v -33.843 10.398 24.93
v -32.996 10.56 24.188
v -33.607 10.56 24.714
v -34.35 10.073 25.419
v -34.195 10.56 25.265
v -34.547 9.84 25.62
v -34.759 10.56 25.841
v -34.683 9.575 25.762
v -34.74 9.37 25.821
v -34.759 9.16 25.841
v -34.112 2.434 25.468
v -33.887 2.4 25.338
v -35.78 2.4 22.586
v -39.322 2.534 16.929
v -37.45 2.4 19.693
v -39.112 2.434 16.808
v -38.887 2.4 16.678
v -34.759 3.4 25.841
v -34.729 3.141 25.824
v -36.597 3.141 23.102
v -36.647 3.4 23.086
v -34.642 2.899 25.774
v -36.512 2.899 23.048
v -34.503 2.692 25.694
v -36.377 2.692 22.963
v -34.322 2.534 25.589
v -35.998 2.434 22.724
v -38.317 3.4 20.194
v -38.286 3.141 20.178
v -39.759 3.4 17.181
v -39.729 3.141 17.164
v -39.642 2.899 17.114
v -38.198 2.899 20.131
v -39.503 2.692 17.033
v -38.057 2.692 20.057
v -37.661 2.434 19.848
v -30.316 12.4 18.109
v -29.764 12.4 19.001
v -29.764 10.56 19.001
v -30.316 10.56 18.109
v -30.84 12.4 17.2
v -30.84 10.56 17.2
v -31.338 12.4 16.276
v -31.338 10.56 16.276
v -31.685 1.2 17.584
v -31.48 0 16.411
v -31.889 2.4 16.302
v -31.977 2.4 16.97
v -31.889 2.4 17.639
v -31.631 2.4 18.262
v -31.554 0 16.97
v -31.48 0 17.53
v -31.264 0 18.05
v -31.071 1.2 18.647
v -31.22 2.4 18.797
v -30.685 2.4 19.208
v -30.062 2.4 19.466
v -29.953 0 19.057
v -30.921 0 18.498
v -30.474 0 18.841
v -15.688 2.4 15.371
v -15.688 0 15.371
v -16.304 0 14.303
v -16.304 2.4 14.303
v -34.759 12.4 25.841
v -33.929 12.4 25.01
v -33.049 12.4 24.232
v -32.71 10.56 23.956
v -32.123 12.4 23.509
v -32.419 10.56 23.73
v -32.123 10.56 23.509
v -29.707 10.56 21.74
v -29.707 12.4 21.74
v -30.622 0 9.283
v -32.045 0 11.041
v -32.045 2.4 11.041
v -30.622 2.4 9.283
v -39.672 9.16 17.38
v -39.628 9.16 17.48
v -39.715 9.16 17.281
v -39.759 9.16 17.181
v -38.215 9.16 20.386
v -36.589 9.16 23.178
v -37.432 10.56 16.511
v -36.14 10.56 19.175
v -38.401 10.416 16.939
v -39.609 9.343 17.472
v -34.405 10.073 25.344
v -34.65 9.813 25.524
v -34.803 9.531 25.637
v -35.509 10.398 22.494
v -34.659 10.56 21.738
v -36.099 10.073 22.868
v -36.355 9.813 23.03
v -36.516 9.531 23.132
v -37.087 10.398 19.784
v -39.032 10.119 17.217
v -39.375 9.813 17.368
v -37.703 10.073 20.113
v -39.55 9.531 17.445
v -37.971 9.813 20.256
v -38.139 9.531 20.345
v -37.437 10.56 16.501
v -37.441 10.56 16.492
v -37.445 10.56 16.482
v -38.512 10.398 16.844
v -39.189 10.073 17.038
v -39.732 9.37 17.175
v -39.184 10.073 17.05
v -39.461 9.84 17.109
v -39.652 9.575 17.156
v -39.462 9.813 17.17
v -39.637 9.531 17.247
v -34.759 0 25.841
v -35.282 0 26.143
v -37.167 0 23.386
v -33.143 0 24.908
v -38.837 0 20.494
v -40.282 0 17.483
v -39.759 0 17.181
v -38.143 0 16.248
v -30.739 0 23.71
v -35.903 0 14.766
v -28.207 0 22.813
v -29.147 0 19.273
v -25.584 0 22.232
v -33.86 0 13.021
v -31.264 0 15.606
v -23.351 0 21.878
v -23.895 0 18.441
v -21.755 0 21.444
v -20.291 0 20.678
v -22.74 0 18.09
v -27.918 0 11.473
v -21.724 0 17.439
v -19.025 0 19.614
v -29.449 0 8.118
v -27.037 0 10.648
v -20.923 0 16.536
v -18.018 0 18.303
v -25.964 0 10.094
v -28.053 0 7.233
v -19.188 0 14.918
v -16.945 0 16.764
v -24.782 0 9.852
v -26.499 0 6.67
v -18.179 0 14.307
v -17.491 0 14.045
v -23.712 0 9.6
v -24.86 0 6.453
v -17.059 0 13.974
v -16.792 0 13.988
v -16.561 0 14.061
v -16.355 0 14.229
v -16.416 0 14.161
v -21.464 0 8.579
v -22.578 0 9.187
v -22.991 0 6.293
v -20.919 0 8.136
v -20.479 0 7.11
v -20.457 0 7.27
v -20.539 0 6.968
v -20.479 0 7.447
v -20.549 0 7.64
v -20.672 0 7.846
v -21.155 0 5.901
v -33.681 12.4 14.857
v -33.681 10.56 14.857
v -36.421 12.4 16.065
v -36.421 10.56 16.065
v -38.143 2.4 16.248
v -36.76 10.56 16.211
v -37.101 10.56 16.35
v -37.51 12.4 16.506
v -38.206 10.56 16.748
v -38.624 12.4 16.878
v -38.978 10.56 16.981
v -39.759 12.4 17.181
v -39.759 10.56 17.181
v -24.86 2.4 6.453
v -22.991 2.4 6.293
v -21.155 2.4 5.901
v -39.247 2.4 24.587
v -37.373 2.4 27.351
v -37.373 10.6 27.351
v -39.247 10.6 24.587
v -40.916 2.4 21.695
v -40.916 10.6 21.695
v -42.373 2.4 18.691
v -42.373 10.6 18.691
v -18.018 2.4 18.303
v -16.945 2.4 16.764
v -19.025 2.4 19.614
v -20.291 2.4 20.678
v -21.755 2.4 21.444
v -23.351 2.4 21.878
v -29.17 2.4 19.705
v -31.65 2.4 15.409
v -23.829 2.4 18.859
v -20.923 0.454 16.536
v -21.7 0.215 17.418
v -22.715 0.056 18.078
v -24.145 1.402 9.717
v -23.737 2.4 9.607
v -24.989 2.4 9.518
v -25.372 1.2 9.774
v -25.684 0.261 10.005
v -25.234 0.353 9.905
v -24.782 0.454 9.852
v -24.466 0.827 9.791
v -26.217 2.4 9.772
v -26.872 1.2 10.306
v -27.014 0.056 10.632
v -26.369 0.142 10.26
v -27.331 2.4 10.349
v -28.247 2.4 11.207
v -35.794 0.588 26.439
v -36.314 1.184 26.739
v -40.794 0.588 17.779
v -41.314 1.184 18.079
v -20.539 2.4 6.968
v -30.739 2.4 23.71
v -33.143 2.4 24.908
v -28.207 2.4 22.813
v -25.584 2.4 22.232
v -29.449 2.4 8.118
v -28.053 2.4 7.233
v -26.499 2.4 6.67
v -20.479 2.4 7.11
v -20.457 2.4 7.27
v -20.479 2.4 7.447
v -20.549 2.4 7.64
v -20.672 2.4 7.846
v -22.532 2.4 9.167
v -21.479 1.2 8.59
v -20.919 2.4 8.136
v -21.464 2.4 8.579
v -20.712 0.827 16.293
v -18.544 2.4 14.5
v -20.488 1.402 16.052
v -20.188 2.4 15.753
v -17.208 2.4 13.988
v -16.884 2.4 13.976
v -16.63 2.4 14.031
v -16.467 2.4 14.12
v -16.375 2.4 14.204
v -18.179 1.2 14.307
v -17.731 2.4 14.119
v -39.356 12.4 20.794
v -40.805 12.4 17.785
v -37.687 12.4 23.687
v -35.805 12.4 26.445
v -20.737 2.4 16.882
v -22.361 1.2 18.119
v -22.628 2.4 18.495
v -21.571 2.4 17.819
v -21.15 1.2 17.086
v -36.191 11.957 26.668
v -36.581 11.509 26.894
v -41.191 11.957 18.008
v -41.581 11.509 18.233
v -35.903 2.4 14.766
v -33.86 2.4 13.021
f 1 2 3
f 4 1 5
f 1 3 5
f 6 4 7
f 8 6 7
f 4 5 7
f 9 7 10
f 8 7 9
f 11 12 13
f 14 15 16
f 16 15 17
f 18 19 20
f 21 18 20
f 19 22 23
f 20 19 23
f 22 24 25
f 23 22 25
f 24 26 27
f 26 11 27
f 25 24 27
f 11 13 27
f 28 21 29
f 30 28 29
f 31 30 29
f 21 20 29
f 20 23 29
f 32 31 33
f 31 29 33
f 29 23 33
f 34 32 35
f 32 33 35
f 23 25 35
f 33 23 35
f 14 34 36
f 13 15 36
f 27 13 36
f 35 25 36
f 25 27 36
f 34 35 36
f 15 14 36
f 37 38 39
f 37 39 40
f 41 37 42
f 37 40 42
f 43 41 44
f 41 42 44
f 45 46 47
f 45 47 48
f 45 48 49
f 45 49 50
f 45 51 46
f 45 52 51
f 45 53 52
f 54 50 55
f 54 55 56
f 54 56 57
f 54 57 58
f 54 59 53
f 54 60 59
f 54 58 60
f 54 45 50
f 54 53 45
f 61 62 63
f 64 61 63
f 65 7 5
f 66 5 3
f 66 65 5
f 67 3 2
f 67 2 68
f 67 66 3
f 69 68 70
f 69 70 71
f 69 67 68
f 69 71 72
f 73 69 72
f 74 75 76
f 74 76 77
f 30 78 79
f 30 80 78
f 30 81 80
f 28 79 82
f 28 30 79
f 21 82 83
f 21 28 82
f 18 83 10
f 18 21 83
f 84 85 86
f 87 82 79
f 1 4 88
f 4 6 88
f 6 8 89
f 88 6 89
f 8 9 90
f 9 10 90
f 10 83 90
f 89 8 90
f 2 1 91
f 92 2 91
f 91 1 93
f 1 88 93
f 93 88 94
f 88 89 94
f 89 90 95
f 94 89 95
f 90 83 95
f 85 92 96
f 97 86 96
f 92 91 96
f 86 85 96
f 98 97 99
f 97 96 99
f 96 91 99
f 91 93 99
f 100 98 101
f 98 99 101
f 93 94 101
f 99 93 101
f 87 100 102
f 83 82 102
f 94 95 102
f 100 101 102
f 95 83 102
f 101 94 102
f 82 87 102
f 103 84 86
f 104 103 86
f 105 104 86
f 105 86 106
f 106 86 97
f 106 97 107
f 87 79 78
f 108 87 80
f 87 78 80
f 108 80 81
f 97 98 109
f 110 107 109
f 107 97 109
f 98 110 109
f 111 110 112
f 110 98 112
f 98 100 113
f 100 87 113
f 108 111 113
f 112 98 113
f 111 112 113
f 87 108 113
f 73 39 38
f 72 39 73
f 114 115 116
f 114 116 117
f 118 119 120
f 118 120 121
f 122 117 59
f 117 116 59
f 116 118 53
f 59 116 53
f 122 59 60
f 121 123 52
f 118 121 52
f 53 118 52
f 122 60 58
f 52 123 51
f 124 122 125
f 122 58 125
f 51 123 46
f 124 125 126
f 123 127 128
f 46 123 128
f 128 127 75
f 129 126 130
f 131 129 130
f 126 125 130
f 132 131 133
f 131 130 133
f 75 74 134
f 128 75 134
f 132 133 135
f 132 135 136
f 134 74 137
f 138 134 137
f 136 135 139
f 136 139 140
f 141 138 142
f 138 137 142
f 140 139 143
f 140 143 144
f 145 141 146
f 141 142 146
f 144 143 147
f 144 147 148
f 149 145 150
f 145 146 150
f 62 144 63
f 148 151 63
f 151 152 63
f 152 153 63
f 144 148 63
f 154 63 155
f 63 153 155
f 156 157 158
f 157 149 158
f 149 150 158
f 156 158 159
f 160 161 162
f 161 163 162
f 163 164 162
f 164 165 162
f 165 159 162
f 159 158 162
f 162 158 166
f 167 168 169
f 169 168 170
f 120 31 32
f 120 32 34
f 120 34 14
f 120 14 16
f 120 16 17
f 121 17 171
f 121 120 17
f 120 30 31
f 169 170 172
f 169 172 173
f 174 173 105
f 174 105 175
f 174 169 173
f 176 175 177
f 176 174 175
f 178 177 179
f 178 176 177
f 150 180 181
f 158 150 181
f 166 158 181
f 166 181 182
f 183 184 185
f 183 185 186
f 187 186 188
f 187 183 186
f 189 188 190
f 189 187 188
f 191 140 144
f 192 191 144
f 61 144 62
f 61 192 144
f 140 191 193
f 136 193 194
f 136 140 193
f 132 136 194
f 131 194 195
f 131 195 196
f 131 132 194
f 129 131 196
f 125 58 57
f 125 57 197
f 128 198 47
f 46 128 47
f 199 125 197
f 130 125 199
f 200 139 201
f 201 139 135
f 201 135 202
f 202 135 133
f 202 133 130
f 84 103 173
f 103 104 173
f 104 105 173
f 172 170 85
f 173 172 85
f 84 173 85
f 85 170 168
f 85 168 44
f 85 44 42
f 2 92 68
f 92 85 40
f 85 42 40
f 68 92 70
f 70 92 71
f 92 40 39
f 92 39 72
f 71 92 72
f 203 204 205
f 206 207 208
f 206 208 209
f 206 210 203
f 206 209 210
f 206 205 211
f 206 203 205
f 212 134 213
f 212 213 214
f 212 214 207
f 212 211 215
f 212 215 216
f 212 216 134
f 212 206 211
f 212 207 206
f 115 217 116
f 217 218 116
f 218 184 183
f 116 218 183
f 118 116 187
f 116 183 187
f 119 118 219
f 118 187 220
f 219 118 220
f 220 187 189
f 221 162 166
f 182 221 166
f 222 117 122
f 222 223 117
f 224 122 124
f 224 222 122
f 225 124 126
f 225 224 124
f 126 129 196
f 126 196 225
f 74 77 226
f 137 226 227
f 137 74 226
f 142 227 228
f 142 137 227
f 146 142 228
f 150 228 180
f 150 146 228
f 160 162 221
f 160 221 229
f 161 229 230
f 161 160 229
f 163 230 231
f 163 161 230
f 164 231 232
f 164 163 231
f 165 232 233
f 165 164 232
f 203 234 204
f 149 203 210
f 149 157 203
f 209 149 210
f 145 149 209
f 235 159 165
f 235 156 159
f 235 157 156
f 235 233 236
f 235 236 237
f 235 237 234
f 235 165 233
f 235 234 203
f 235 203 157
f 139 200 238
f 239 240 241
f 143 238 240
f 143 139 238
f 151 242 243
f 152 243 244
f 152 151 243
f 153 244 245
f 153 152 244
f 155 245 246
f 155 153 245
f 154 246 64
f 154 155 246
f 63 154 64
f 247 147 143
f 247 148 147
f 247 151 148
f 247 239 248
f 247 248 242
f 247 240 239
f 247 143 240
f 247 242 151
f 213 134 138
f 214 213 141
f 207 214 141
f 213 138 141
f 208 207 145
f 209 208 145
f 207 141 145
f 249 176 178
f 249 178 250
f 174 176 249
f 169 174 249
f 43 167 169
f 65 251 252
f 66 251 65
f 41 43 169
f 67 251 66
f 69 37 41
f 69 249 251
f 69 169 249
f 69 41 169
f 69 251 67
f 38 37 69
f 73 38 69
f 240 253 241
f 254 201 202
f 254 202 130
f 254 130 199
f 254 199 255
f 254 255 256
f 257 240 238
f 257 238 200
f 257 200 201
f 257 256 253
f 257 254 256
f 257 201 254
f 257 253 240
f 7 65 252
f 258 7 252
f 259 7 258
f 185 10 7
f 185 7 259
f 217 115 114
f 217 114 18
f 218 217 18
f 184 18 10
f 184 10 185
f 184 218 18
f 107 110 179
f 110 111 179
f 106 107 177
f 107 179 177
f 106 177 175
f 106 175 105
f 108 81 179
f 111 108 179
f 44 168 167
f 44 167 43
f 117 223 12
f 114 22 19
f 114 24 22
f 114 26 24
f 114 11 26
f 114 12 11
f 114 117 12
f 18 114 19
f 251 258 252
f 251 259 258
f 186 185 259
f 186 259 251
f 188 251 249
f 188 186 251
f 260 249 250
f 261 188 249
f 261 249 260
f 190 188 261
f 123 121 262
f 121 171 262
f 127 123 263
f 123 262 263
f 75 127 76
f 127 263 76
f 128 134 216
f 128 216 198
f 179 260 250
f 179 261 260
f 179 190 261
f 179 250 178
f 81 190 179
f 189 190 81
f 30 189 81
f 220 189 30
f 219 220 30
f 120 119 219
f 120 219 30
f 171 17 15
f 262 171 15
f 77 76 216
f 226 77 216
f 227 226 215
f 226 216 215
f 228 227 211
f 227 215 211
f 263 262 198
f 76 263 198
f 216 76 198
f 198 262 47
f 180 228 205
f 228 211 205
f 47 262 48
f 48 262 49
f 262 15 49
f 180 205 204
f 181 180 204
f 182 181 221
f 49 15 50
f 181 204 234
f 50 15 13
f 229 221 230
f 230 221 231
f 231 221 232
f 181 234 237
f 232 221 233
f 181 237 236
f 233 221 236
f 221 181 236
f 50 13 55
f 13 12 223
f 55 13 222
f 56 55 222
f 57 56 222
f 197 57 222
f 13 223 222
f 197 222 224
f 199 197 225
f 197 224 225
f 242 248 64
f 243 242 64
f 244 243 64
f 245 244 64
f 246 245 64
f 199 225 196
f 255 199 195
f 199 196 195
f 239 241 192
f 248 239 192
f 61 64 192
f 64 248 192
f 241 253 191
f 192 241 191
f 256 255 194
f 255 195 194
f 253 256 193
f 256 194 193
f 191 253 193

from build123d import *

# Parameters (mm, degrees)
EXTRUDE_1_DEPTH     = 2.4
EXTRUDE_1_DRAFT     = 10
EXTRUDE_2_DEPTH     = 12.4
EXTRUDE_4_DEPTH     = 2.4
EXTRUDE_START       = -1.84
EXTRUDE_3_DEPTH     = 1.84
CHAMFER_1_SIZE      = 2.4
FILLET_3_R          = 1
FILLET_4_R          = 19
CHAMFER_2_SIZE      = 1.5
CHAMFER_3_SIZE      = 1.5
FILLET_5_SIZE       = 2.4
FILLET_5_SIZE_2     = 1.4
FILLET_8_R          = 15
CUT_EXTRUDE_2_DEPTH = 5
FILLET_6_DEPTH      = 2.4
FILLET_7_DEPTH      = 2.4
CHAMFER_4_SIZE      = 1.8
FILLET_9_R          = 22


with BuildPart() as part:
    # 草图1 → 凸台-拉伸1 (with draft: the straight prism first)
    with BuildSketch(Plane(origin=(0, 0, 0), x_dir=(1, 0, 0), z_dir=(0, 1, 0))):
        with BuildLine():
            Line((-8, -10.392304845), (-13, -1.732050808))
            Line((-13, -1.732050808), (-21.967816979, -6.909622355))
            Line((-21.967816979, -6.909622355), (-22.707395472, -6.711455524))
            ThreePointArc((-22.707395472, -6.711455524), (-27.045667208, -6.825066474), (-30.622176838, -9.283132374))
            Line((-30.622176838, -9.283132374), (-34.43427487, -13.990668154))
            Line((-34.43427487, -13.990668154), (-34.611399325, -14.209398026))
            Line((-34.611399325, -14.209398026), (-39.758714523, -17.181201841))
            ThreePointArc((-39.758714523, -17.181201841), (-37.509489571, -21.656113901), (-34.758714523, -25.841455878))
            Line((-34.758714523, -25.841455878), (-29.611399325, -22.869652063))
            Line((-29.611399325, -22.869652063), (-29.333411472, -22.825622721))
            Line((-29.333411472, -22.825622721), (-23.350516885, -21.878016874))
            ThreePointArc((-23.350516885, -21.878016874), (-19.433514554, -20.009701627), (-17.165988715, -16.309453567))
            Line((-17.165988715, -16.309453567), (-16.967816979, -15.569876393))
            Line((-16.967816979, -15.569876393), (-8, -10.392304845))
        make_face()
        with BuildLine():
            Line((-27.917710858, -11.473169763), (-31.264303283, -15.605855609))
            Line((-31.264303283, -15.605855609), (-31.480162481, -16.411447438))
            ThreePointArc((-31.480162481, -16.411447438), (-31.264379417, -18.05049777), (-29.952811807, -19.056896659))
            Line((-29.952811807, -19.056896659), (-29.147219046, -19.27275307))
            Line((-29.147219046, -19.27275307), (-23.894912088, -18.440861966))
            ThreePointArc((-23.894912088, -18.440861966), (-21.762087, -17.423555776), (-20.527408298, -15.408754734))
            Line((-20.527408298, -15.408754734), (-19.958845574, -13.286877913))
            ThreePointArc((-19.958845574, -13.286877913), (-20.174626779, -11.647826039), (-21.486196869, -10.641428268))
            Line((-21.486196869, -10.641428268), (-23.608077089, -10.07287972))
            ThreePointArc((-23.608077089, -10.07287972), (-25.97028529, -10.134742248), (-27.917710858, -11.473169763))
        make_face(mode=Mode.SUBTRACT)
    extrude(amount=EXTRUDE_1_DEPTH)
    # 凸台-拉伸1: the draft: its side faces are tilted about the plane it starts from
    extrude_1_sides = [part.faces().sort_by_distance(p)[0] for p in [
        (-26.480958105, 1.2, 22.373834469),
        (-29.59100707, 1.2, 13.539512686),
        (-31.372232882, 1.2, 16.008651523),
        (-31.264379417, 1.2, 18.05049777),
        (-29.550015427, 1.2, 19.164824864),
        (-26.521065567, 1.2, 18.856807518),
        (-21.762087, 1.2, 17.423555776),
        (-20.243126936, 1.2, 14.347816323),
        (-20.174626779, 1.2, 11.647826039),
        (-22.547136979, 1.2, 10.357153994),
        (-25.97028529, 1.2, 10.134742248),
        (-37.509489571, 1.2, 21.656113901),
        (-37.185056924, 1.2, 15.695299933),
        (-32.616788082, 1.2, 11.7462652),
        (-27.045667208, 1.2, 6.825066474),
        (-22.337606226, 1.2, 6.810538939),
        (-17.48390849, 1.2, 4.320836581),
        (-10.5, 1.2, 6.062177826),
        (-12.48390849, 1.2, 12.981090619),
        (-17.066902847, 1.2, 15.93966498),
        (-32.185056924, 1.2, 24.355553971),
        (-19.433514554, 1.2, 20.009701627),
    ]]
    draft(extrude_1_sides, Plane(origin=(0, 0, 0), x_dir=(1, 0, 0), z_dir=(0, 1, 0)), EXTRUDE_1_DRAFT)



with BuildPart() as body_2:
    # 草图3 → 凸台-拉伸2 (new body)
    with BuildSketch(Plane.XZ):
        with BuildLine():
            Line((-34.758714523, 25.841455878), (-37.373134226, 27.350891798))
            ThreePointArc((-37.373134226, 27.350891798), (-40.107565783, 23.156113901), (-42.373134226, 18.69063776))
            Line((-42.373134226, 18.69063776), (-39.758714523, 17.181201841))
            ThreePointArc((-39.758714523, 17.181201841), (-37.509489571, 21.656113901), (-34.758714523, 25.841455878))
        make_face()
    extrude(amount=-EXTRUDE_2_DEPTH)


with BuildPart() as part_1:
    add(part.part)

    add(body_2.part)  # 凸台-拉伸4 merges body 2
    # 草图2 → 凸台-拉伸4 (add)
    with BuildSketch(Plane.XZ):
        with BuildLine():
            Line((-13, 1.732050808), (-8, 10.392304845))
            Line((-8, 10.392304845), (-16.967816979, 15.569876393))
            Line((-16.967816979, 15.569876393), (-17.165988715, 16.309453567))
            ThreePointArc((-17.165988715, 16.309453567), (-19.433514554, 20.009701627), (-23.350516885, 21.878016874))
            Line((-23.350516885, 21.878016874), (-29.611399325, 22.869652063))
            Line((-29.611399325, 22.869652063), (-34.758714523, 25.841455878))
            ThreePointArc((-34.758714523, 25.841455878), (-37.509489571, 21.656113901), (-39.758714523, 17.181201841))
            Line((-39.758714523, 17.181201841), (-34.611399325, 14.209398026))
            Line((-34.611399325, 14.209398026), (-30.622176838, 9.283132374))
            ThreePointArc((-30.622176838, 9.283132374), (-27.045667208, 6.825066474), (-22.707395472, 6.711455524))
            Line((-22.707395472, 6.711455524), (-21.967816979, 6.909622355))
            Line((-21.967816979, 6.909622355), (-13, 1.732050808))
        make_face()
        Polygon((-28.267922288, 9.695660603), (-32.994912051, 15.569876392), (-31.812956682, 19.594100966), (-26.346816011, 20.919608689), (-19.040272004, 17.121163853), (-18.489608424, 9.956624946), (-26.72941961, 8.295337377), align=None, mode=Mode.SUBTRACT)
    extrude(amount=-EXTRUDE_4_DEPTH)

    # 草图4 → 凸台-拉伸3 (add)
    with BuildSketch(Plane(origin=(0, 12.4, 0), x_dir=(1, 0, 0), z_dir=(0, 1, 0)).offset(EXTRUDE_START)):
        with BuildLine():
            Line((-32.308740898, -14.251269906), (-42.373134226, -18.69063776))
            ThreePointArc((-42.373134226, -18.69063776), (-40.107565783, -23.156113901), (-37.373134226, -27.350891798))
            Line((-37.373134226, -27.350891798), (-28.496332224, -20.854555429))
            ThreePointArc((-28.496332224, -20.854555429), (-30.581286341, -17.656113901), (-32.308740898, -14.251269906))
        make_face()
    extrude(amount=EXTRUDE_3_DEPTH)

    # 倒角1
    chamfer_1_edges = [part_1.edges().sort_by_distance(p)[0] for p in [
        (-40.107565783, 0, 23.156113901),
    ]]
    chamfer(chamfer_1_edges, length=CHAMFER_1_SIZE)

    # 圆角3
    fillet_3_edges = [part_1.edges().sort_by_distance(p)[0] for p in [
        (-37.509489571, 2.4, 21.656113901),
    ]]
    fillet(fillet_3_edges, radius=FILLET_3_R)

    # 圆角4
    # the kernel refuses this fillet: 19 mm, written as the material it adds along each edge
    with BuildSketch(Plane(origin=(-34.952188225, 12.4, 25.579163697), x_dir=(0.5936081582817637, 0, 0.8047542198841411), z_dir=(0, -1, 0))) as fillet_4_piece_1:
        with BuildLine():
            CenterArc((19.013054585, -3.433847914), FILLET_4_R, 169.587784597, 10.627793791)
            Line((0.013189074, -3.505336246), (0, 0))
            ThreePointArc((0, 0), (0.162964154, 0.000306581), (0.325928308, 0))
        make_face()
    extrude(amount=1.84)
    with BuildSketch(Plane(origin=(-39.628299682, 12.4, 17.479901072), x_dir=(-0.4001335190817456, 0, -0.9164568549076701), z_dir=(0, -1, 0))) as fillet_4_piece_2:
        with BuildLine():
            CenterArc((19.013054585, 3.433847914), FILLET_4_R, 179.784421612, 10.627793791)
            Line((0.013189074, 3.505336246), (0, 0))
            ThreePointArc((0, 0), (0.162964154, -0.000306581), (0.325928308, 0))
        make_face()
    extrude(amount=1.84)

    # 倒角2
    # the kernel refuses this chamfer: 2.14222201, 1.5 mm, written as the material it takes off along each edge
    with BuildSketch(Plane(origin=(-32.308740898, 4.766259481, 14.251269906), x_dir=(-0.9149448479771033, 0, 0.40357889583098305), z_dir=(0, 1, 0))) as chamfer_2_piece_1:
        with BuildLine():
            Line((CHAMFER_2_SIZE, 0), (-0.071382965, 2.24416745))
            ThreePointArc((-0.071382965, 2.24416745), (-0.019009883, 1.158534109), (0, 0))
            Line((0, 0), (CHAMFER_2_SIZE, 0))
        make_face()
    extrude(amount=13.427481039, mode=Mode.SUBTRACT)

    # 倒角3
    # the kernel refuses this chamfer: 2.14222201, 1.5 mm, written as the material it takes off along each edge
    with BuildSketch(Plane(origin=(-28.496332224, 4.766259481, 20.854555429), x_dir=(-0.564621815428285, 0, -0.8253497474055879), z_dir=(0, 1, 0))) as chamfer_3_piece_1:
        with BuildLine():
            Line((2.245302445, 0), (-CHAMFER_3_SIZE * 0.0317921380924, CHAMFER_3_SIZE * 0.999494502214))
            Line((-CHAMFER_3_SIZE * 0.0317921380924, CHAMFER_3_SIZE * 0.999494502214), (0, 0))
            ThreePointArc((0, 0), (1.158552838, 0.017832003), (2.245302445, 0))
        make_face()
    extrude(amount=13.427481039, mode=Mode.SUBTRACT)

    # 圆角5
    # a fillet whose section is not a circle: 2.4, 1.4 mm, written as the material it adds along each edge
    with BuildSketch(Plane(origin=(-2e-09, 10.56, 2e-09), x_dir=(-0.7124395855651336, 0, 0.7017334514755447), z_dir=(0.7017334514755447, 0, 0.7124395855651336))) as fillet_5_piece_1_section:
        with BuildLine():
            Bezier((43.3122278 - FILLET_5_SIZE, 0), (43.3122278, 0), (43.3122278, FILLET_5_SIZE_2), weights=[1, 0.707106781, 1])
            Line((43.3122278, FILLET_5_SIZE_2), (43.3122278, 0))
            Line((43.3122278, 0), (43.3122278 - FILLET_5_SIZE, 0))
        make_face()
    fillet_5_piece_1 = revolve(axis=Axis((-2e-09, 10.56, 2e-09), (0, -1, 0)), revolution_arc=20.76414098, mode=Mode.PRIVATE)
    fillet_5_piece_1 = fillet_5_piece_1 - Plane(origin=(-20.90248031, 10.56, 38.841639471), x_dir=(0.5936081582819842, 0, 0.8047542198839785), z_dir=(0, 1, 0)) * Cylinder(19, 174, mode=Mode.PRIVATE)
    fillet_5_piece_1 = split(fillet_5_piece_1, bisect_by=Plane(origin=(2.499999998, 10.56, 4.33012702), z_dir=(-0.5000000000000001, 0, -0.8660254037844386)), keep=Keep.TOP, mode=Mode.PRIVATE)
    add(fillet_5_piece_1)
    with BuildSketch(Plane(origin=(-3e-09, 10.56, 1e-09), x_dir=(-0.9149448479769536, 0, 0.4035788958313223), z_dir=(0.4035788958313223, 0, 0.9149448479769536))) as fillet_5_piece_2_section:
        with BuildLine():
            Bezier((43.3122278 - FILLET_5_SIZE, 0), (43.3122278, 0), (43.3122278, FILLET_5_SIZE_2), weights=[1, 0.707106781, 1])
            Line((43.3122278, FILLET_5_SIZE_2), (43.3122278, 0))
            Line((43.3122278, 0), (43.3122278 - FILLET_5_SIZE, 0))
        make_face()
    fillet_5_piece_2 = revolve(axis=Axis((-3e-09, 10.56, 1e-09), (0, -1, 0)), revolution_arc=8.368284413, mode=Mode.PRIVATE)
    fillet_5_piece_2 = fillet_5_piece_2 - Plane(origin=(-44.089086662, 10.56, -1.318740785), x_dir=(-0.4001335190818383, 0, -0.9164568549076296), z_dir=(0, 1, 0)) * Cylinder(19, 174, mode=Mode.PRIVATE)
    fillet_5_piece_2 = split(fillet_5_piece_2, bisect_by=Plane(origin=(-2.500000002, 10.56, -4.330127018), z_dir=(0.4999999999999988, 0, 0.8660254037844394)), keep=Keep.TOP, mode=Mode.PRIVATE)
    add(fillet_5_piece_2)

    # 圆角8
    fillet_8_edges = [part_1.edges().sort_by_distance(p)[0] for p in [
        (-16.967816979, 1.2, 15.569876393),
        (-21.967816979, 1.2, 6.909622355),
    ]]
    fillet(fillet_8_edges, radius=FILLET_8_R)

    # 草图5 → 切除-拉伸2 (cut)
    with BuildSketch(Plane.XZ):
        with BuildLine():
            Line((-29.147219046, 19.27275307), (-31.264303283, 15.605855609))
            Line((-31.264303283, 15.605855609), (-27.917710858, 11.473169763))
            ThreePointArc((-27.917710858, 11.473169763), (-26.519580592, 10.33421548), (-24.781854923, 9.852245982))
            ThreePointArc((-24.781854923, 9.852245982), (-22.061802465, 9.586923289), (-19.411053684, 8.921632073))
            Line((-19.411053684, 8.921632073), (-21.155274081, 5.900553727))
            Line((-21.155274081, 5.900553727), (-15.208253994, -4.420406035))
            Line((-15.208253994, -4.420406035), (0.192169605, 10.177783302))
            Line((0.192169605, 10.177783302), (-15.687666464, 15.370727914))
            Line((-15.687666464, 15.370727914), (-17.431886861, 12.349649567))
            ThreePointArc((-17.431886861, 12.349649567), (-19.333420345, 14.312619743), (-20.923222766, 16.535592924))
            ThreePointArc((-20.923222766, 16.535592924), (-22.209483528, 17.799522767), (-23.894912088, 18.440861966))
            Line((-23.894912088, 18.440861966), (-29.147219046, 19.27275307))
        make_face()
    extrude(amount=-CUT_EXTRUDE_2_DEPTH, mode=Mode.SUBTRACT)

    # 圆角6: read off the stored shape, not the designer's step
    # 圆角6 outline → 圆角6 (cut)
    with BuildSketch(Plane(origin=(0, 0, 0), x_dir=(1, 0, 0), z_dir=(0, 1, 0))):
        with BuildLine():
            Line((-19.411053684, -8.921632073), (-20.538770468, -6.968369307))
            add(Edge.make_bspline(
                [(-20.538770468, -6.968369307), (-19.421581423, -8.903397494), (-24.781854923, -9.852245982)],
                knots=[0, 0, 0, 1, 1, 1], degree=2, weights=[1, 0.573849647, 1]))
            ThreePointArc((-24.781854923, -9.852245982), (-22.061802466, -9.586923289), (-19.411053684, -8.921632073))
        make_face()
    extrude(amount=FILLET_6_DEPTH, mode=Mode.SUBTRACT)

    # 圆角7: read off the stored shape, not the designer's step
    # 圆角7 outline → 圆角7 (cut)
    with BuildSketch(Plane(origin=(0, 0, 0), x_dir=(1, 0, 0), z_dir=(0, 1, 0))):
        with BuildLine():
            ThreePointArc((-17.431886861, -12.349649567), (-19.333420346, -14.312619744), (-20.923222767, -16.535592926))
            add(Edge.make_bspline(
                [(-20.923222767, -16.535592926), (-17.421359117, -12.367884155), (-16.304170077, -14.302912333)],
                knots=[0, 0, 0, 1, 1, 1], degree=2, weights=[1, 0.573849648, 1]))
            Line((-16.304170077, -14.302912333), (-17.431886861, -12.349649567))
        make_face()
    extrude(amount=FILLET_7_DEPTH, mode=Mode.SUBTRACT)

    # 倒角4
    chamfer_4_edges = [part_1.edges().sort_by_distance(p)[0] for p in [
        (-40.107565783, 12.4, 23.156113901),
    ]]
    chamfer(chamfer_4_edges, length=CHAMFER_4_SIZE)

    # 圆角9
    fillet_9_edges = [part_1.edges().sort_by_distance(p)[0] for p in [
        (-34.611399325, 1.2, 14.209398026),
        (-29.611399325, 1.2, 22.869652063),
    ]]
    fillet(fillet_9_edges, radius=FILLET_9_R)


solid = part_1.part
